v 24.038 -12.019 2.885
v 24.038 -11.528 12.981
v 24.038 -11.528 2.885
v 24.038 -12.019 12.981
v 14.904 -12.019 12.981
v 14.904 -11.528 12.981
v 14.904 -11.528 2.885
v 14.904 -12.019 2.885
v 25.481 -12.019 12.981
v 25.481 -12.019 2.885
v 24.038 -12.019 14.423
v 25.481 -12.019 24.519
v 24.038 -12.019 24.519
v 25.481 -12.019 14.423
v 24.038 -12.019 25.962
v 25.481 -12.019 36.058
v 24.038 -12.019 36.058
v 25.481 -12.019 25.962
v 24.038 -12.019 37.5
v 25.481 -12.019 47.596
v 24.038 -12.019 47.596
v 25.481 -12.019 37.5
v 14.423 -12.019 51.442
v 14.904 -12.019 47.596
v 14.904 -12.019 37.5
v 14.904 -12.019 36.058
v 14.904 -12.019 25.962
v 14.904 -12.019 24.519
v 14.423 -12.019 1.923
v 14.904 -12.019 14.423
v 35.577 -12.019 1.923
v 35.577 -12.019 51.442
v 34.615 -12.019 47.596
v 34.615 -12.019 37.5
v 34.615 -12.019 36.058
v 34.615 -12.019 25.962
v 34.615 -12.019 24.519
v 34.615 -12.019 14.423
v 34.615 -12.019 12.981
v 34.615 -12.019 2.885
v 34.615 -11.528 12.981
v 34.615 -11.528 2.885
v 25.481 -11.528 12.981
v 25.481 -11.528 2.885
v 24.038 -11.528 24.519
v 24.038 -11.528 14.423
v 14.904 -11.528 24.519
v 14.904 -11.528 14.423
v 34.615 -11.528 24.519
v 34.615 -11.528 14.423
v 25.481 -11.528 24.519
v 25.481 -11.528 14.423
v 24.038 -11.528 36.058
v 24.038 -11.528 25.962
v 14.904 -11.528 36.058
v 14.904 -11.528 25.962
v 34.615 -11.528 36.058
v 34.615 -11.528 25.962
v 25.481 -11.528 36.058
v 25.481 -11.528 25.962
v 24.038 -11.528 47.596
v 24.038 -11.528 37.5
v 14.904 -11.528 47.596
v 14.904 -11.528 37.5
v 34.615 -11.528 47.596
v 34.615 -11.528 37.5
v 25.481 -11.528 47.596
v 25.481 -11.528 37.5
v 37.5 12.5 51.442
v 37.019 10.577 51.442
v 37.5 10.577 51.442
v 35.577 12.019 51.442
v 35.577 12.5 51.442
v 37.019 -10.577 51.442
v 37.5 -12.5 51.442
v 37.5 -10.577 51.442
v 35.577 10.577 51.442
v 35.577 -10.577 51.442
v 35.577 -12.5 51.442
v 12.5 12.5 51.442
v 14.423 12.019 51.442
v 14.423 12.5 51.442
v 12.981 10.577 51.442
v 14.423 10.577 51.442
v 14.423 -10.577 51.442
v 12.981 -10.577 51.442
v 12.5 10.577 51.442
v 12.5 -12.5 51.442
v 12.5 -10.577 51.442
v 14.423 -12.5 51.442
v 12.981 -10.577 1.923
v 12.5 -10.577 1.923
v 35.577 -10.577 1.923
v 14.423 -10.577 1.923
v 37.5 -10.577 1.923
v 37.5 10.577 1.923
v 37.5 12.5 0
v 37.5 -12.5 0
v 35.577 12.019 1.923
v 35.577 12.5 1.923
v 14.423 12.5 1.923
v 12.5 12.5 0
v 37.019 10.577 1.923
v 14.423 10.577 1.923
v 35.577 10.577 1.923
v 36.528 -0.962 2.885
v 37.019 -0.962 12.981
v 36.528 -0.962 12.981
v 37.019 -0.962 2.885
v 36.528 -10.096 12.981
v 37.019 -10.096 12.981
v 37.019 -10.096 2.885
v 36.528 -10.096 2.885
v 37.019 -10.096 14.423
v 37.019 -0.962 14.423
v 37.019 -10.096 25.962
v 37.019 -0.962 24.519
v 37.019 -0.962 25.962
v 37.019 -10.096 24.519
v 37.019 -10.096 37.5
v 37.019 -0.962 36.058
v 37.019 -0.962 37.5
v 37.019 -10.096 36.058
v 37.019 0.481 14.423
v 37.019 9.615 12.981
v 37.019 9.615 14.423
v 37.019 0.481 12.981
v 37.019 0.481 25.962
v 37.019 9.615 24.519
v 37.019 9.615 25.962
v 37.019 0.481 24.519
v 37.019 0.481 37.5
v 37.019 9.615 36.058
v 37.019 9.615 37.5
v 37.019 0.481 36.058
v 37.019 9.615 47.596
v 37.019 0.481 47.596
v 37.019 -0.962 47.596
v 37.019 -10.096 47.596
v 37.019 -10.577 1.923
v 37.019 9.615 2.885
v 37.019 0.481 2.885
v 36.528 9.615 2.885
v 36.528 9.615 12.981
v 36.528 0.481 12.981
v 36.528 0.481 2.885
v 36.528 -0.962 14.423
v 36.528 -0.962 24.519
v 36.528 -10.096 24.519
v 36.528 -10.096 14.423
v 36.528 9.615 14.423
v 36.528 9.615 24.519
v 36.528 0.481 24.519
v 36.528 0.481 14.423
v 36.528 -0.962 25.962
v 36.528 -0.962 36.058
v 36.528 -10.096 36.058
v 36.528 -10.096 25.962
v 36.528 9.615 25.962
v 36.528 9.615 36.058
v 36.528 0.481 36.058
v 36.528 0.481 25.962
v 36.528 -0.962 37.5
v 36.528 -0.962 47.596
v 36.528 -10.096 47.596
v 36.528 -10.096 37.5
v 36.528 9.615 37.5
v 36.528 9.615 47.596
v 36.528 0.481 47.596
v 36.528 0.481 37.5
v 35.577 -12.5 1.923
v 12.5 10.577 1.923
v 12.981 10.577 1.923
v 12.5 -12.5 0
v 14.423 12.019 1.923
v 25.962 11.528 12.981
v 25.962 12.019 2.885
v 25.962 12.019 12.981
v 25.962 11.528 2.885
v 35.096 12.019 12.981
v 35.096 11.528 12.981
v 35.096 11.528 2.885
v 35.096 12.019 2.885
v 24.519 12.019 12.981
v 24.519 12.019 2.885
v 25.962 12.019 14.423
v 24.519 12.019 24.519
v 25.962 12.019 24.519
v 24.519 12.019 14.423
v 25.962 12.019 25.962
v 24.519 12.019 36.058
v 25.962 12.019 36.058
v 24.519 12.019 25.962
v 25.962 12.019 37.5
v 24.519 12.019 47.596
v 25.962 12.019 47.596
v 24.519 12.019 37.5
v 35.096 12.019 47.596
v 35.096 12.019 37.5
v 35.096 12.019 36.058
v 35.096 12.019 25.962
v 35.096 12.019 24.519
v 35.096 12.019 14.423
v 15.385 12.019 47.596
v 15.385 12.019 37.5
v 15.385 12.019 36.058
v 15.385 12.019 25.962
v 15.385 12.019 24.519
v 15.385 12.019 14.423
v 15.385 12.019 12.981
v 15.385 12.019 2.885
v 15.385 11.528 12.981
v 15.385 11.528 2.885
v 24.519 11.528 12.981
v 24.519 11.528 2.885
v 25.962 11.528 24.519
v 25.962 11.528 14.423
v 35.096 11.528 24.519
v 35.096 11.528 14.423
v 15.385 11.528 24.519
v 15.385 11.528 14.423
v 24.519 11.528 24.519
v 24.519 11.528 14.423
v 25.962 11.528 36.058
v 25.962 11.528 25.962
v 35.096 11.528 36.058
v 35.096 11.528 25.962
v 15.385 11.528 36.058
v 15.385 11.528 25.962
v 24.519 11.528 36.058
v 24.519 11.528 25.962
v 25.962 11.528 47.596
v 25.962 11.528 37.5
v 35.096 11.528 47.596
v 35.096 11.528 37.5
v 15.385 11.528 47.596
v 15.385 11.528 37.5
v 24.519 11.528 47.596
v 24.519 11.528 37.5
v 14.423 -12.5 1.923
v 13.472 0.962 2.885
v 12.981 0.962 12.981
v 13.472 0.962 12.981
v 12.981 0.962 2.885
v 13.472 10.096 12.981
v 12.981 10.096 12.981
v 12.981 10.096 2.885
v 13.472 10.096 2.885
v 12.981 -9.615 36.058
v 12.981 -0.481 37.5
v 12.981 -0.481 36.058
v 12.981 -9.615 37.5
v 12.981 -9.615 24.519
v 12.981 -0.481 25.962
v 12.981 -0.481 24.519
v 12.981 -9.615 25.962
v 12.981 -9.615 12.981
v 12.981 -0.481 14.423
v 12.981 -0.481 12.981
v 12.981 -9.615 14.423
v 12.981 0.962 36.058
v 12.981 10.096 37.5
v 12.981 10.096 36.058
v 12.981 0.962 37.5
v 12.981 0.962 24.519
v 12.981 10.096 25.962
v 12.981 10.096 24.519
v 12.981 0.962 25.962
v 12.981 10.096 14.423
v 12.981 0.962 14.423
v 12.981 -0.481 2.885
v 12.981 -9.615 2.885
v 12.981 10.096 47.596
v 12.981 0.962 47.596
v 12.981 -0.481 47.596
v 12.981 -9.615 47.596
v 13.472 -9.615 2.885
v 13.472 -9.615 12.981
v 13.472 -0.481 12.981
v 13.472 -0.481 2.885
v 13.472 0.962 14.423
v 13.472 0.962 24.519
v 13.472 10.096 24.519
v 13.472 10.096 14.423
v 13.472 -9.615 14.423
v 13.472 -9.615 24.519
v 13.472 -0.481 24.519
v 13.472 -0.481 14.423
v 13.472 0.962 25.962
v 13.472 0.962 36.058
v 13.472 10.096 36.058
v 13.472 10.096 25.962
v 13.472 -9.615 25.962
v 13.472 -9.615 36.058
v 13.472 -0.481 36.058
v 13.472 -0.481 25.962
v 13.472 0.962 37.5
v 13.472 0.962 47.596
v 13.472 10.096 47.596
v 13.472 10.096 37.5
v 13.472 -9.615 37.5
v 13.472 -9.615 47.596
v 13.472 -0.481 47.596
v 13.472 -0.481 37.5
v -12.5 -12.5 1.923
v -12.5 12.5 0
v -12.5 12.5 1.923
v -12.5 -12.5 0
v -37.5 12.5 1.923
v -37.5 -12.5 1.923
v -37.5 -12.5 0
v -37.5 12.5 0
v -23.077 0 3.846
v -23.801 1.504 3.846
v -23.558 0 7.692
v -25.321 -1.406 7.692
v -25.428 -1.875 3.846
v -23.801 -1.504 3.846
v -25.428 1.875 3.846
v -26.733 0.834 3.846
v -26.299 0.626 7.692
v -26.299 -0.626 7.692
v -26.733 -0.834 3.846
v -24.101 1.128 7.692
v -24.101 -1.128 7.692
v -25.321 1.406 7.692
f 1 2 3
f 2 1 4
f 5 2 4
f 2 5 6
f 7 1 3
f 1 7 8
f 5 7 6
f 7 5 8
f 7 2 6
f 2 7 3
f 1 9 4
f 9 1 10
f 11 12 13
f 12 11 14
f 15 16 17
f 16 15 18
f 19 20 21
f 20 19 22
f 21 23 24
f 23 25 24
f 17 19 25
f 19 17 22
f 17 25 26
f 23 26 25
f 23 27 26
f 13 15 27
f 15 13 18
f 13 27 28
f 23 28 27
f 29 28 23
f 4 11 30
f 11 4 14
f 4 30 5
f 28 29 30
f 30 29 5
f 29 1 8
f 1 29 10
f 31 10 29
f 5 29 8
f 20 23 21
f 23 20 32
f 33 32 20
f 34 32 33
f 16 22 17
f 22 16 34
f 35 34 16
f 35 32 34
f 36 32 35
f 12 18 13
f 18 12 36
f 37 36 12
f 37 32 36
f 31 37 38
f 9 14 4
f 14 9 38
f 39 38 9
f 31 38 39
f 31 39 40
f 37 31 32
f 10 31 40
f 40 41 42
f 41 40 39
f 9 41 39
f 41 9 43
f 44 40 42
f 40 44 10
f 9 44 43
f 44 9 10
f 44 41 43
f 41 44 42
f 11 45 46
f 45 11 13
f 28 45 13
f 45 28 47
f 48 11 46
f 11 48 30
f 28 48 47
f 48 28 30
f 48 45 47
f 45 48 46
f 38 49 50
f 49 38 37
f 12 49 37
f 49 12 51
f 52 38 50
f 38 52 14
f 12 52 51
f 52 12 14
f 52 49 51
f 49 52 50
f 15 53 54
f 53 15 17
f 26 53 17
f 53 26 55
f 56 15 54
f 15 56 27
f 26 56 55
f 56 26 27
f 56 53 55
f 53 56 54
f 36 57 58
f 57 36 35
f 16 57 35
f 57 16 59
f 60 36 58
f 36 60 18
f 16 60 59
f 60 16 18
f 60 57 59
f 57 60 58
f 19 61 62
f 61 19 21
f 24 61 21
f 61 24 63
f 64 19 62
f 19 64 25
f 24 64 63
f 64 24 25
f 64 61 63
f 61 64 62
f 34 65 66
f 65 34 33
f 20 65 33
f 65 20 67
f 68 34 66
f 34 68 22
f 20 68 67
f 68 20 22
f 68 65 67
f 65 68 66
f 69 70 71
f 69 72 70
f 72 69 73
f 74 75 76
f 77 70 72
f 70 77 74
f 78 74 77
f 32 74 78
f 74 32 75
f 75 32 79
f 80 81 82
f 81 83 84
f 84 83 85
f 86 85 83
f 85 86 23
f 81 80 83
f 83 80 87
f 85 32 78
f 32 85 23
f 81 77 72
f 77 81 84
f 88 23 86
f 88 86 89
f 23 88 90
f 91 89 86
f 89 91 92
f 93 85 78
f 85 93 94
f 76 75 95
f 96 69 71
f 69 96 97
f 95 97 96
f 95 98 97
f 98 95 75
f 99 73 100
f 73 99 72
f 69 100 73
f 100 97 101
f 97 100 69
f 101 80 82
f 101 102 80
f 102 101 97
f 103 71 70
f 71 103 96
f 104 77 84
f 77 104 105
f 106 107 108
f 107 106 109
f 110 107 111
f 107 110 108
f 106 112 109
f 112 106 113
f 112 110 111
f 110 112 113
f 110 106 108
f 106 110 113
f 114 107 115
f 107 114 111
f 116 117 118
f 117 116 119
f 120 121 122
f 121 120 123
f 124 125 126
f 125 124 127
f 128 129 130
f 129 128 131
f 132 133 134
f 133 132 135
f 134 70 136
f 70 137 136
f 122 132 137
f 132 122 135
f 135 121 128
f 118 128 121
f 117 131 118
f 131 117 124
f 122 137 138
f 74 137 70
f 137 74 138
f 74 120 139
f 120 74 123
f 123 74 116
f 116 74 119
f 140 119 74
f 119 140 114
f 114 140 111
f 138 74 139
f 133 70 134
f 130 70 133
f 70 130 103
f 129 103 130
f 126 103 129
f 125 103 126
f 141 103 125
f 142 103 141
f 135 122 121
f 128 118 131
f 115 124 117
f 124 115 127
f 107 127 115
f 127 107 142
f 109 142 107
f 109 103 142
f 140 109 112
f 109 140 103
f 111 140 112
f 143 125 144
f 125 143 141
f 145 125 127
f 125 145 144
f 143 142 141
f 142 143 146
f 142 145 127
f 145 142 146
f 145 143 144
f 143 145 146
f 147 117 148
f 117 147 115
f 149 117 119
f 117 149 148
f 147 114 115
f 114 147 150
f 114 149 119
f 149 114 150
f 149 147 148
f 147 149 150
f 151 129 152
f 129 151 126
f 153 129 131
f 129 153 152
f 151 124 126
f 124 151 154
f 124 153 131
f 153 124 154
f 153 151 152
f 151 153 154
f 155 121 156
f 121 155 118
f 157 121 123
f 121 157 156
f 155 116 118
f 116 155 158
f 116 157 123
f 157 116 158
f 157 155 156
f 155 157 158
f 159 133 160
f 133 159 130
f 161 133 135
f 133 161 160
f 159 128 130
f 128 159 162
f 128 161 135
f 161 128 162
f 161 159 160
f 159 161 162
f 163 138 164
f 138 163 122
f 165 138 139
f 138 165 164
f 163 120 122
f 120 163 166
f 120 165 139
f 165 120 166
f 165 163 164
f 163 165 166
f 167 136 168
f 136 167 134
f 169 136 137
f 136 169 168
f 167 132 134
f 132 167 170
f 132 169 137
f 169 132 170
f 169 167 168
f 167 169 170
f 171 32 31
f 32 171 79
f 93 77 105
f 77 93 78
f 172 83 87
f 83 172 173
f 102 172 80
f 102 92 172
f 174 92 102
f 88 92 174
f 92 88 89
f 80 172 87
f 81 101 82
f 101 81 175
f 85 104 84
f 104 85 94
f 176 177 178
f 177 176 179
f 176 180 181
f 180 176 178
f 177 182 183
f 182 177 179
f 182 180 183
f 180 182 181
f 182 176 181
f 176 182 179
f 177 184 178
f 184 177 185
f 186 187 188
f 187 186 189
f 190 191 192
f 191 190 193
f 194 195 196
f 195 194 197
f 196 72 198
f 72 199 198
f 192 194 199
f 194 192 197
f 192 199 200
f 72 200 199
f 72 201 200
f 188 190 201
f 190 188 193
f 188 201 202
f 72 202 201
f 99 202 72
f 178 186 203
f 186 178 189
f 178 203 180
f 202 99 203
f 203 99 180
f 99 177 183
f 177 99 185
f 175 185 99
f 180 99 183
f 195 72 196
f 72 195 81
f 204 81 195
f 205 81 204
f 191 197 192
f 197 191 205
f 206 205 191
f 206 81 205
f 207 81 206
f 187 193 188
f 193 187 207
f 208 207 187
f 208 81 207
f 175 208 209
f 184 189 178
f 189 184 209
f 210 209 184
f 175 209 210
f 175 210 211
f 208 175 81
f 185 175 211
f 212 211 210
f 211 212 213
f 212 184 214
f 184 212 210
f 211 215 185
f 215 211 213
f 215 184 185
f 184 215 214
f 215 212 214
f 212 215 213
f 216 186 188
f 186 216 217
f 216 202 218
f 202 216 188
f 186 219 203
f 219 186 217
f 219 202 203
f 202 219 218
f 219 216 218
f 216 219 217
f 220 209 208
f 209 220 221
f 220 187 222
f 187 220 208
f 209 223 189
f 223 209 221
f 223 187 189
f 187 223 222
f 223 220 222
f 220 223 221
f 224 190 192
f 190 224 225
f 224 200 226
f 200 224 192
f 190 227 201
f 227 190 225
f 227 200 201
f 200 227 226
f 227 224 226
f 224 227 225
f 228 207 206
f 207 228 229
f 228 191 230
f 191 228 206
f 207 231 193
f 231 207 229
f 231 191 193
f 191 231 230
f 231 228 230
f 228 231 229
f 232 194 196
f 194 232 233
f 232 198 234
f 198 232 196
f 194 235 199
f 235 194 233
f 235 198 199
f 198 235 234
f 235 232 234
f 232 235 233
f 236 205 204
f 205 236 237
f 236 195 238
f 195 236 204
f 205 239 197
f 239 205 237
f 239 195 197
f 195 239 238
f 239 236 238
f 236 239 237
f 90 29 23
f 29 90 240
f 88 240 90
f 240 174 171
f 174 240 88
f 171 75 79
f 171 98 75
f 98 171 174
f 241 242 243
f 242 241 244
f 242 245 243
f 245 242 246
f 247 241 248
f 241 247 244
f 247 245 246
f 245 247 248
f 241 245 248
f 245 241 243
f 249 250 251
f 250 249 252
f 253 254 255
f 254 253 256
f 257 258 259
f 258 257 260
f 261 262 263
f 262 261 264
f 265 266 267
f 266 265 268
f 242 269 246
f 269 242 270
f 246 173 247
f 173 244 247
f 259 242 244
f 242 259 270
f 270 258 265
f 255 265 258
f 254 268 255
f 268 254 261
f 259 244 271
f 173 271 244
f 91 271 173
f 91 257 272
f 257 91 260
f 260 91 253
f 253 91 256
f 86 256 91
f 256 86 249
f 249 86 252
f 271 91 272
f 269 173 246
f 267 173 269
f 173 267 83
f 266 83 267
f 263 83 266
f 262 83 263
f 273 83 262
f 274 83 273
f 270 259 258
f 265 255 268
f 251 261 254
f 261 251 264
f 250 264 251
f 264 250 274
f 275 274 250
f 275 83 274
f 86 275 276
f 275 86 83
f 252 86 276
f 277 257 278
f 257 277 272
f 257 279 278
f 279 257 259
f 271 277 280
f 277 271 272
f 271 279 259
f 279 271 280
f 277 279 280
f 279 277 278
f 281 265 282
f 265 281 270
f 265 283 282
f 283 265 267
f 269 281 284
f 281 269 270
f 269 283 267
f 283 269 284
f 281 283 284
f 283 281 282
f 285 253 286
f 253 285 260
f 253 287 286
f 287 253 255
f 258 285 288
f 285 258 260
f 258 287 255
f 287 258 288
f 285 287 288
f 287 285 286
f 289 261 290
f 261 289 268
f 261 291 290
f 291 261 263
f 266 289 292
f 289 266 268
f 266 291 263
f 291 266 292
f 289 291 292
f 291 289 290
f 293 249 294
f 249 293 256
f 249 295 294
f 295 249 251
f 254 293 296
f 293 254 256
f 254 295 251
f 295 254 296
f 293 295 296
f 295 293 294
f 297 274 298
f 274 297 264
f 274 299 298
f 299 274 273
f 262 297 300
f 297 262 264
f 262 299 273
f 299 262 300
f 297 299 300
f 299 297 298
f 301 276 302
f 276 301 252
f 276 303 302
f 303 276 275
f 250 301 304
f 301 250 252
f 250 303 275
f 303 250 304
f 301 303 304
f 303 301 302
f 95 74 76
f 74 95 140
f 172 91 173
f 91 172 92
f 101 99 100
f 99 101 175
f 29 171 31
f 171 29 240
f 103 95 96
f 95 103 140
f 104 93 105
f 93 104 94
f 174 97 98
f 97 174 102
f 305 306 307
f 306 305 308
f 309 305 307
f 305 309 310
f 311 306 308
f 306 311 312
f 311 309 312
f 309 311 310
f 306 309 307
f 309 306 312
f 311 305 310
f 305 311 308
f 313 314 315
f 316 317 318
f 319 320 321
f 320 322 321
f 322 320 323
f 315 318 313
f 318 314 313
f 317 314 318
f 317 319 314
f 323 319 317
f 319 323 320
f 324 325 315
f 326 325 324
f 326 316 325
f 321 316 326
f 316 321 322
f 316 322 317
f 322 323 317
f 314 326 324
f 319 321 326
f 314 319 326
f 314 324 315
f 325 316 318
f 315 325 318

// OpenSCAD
h=50;
w=h/2;
th=h/26;
th1=th/(4/3);
th2=th/4;

//base
module base() {
	translate([-(w/2),-(w/2),0]) cube([w,w,th]);
	for (rot=[0:3])
		rotate(rot*90)
		union() {
			translate([(w/2)-th,(w/2)-th,th1]) cube([th,th,h]) ;
			difference(){
				translate([-(w/2),-(w/2),0]) translate([th1,th2,th1]) cube([w-2*th1,th1,h]);
				for (x2=[2*th1 : 8*th1 : 26*th1])
					for (x1=[th+th2, 9*th1])
						translate([-(w/2),-(w/2),0]) translate([x1,th2,x2]) cube([(w/2)-(th+th1),th2+0.01,(w/2)-(th+th2)]);
			}
		}
	}


//top
module top(){
	translate([-w/2,-w/2,0]) cube([w,w,th]);
	translate([-w/2,-w/2,th])
		polyhedron(points=[[w/2,w/2,2*th],[0,0,0],[w,0,0],[w,w,0],[0,w,0]],
		triangles=[[1,2,3],[3,1,4],[1,0,2],[2,0,3],[3,0,4],[4,0,1]]);
	translate([0,0,2*th]) cylinder(2*th,th,th1, centre=true);
	}

//color("blue")
translate([w,0,0]) base();
translate([-w,0,0]) top();
 
